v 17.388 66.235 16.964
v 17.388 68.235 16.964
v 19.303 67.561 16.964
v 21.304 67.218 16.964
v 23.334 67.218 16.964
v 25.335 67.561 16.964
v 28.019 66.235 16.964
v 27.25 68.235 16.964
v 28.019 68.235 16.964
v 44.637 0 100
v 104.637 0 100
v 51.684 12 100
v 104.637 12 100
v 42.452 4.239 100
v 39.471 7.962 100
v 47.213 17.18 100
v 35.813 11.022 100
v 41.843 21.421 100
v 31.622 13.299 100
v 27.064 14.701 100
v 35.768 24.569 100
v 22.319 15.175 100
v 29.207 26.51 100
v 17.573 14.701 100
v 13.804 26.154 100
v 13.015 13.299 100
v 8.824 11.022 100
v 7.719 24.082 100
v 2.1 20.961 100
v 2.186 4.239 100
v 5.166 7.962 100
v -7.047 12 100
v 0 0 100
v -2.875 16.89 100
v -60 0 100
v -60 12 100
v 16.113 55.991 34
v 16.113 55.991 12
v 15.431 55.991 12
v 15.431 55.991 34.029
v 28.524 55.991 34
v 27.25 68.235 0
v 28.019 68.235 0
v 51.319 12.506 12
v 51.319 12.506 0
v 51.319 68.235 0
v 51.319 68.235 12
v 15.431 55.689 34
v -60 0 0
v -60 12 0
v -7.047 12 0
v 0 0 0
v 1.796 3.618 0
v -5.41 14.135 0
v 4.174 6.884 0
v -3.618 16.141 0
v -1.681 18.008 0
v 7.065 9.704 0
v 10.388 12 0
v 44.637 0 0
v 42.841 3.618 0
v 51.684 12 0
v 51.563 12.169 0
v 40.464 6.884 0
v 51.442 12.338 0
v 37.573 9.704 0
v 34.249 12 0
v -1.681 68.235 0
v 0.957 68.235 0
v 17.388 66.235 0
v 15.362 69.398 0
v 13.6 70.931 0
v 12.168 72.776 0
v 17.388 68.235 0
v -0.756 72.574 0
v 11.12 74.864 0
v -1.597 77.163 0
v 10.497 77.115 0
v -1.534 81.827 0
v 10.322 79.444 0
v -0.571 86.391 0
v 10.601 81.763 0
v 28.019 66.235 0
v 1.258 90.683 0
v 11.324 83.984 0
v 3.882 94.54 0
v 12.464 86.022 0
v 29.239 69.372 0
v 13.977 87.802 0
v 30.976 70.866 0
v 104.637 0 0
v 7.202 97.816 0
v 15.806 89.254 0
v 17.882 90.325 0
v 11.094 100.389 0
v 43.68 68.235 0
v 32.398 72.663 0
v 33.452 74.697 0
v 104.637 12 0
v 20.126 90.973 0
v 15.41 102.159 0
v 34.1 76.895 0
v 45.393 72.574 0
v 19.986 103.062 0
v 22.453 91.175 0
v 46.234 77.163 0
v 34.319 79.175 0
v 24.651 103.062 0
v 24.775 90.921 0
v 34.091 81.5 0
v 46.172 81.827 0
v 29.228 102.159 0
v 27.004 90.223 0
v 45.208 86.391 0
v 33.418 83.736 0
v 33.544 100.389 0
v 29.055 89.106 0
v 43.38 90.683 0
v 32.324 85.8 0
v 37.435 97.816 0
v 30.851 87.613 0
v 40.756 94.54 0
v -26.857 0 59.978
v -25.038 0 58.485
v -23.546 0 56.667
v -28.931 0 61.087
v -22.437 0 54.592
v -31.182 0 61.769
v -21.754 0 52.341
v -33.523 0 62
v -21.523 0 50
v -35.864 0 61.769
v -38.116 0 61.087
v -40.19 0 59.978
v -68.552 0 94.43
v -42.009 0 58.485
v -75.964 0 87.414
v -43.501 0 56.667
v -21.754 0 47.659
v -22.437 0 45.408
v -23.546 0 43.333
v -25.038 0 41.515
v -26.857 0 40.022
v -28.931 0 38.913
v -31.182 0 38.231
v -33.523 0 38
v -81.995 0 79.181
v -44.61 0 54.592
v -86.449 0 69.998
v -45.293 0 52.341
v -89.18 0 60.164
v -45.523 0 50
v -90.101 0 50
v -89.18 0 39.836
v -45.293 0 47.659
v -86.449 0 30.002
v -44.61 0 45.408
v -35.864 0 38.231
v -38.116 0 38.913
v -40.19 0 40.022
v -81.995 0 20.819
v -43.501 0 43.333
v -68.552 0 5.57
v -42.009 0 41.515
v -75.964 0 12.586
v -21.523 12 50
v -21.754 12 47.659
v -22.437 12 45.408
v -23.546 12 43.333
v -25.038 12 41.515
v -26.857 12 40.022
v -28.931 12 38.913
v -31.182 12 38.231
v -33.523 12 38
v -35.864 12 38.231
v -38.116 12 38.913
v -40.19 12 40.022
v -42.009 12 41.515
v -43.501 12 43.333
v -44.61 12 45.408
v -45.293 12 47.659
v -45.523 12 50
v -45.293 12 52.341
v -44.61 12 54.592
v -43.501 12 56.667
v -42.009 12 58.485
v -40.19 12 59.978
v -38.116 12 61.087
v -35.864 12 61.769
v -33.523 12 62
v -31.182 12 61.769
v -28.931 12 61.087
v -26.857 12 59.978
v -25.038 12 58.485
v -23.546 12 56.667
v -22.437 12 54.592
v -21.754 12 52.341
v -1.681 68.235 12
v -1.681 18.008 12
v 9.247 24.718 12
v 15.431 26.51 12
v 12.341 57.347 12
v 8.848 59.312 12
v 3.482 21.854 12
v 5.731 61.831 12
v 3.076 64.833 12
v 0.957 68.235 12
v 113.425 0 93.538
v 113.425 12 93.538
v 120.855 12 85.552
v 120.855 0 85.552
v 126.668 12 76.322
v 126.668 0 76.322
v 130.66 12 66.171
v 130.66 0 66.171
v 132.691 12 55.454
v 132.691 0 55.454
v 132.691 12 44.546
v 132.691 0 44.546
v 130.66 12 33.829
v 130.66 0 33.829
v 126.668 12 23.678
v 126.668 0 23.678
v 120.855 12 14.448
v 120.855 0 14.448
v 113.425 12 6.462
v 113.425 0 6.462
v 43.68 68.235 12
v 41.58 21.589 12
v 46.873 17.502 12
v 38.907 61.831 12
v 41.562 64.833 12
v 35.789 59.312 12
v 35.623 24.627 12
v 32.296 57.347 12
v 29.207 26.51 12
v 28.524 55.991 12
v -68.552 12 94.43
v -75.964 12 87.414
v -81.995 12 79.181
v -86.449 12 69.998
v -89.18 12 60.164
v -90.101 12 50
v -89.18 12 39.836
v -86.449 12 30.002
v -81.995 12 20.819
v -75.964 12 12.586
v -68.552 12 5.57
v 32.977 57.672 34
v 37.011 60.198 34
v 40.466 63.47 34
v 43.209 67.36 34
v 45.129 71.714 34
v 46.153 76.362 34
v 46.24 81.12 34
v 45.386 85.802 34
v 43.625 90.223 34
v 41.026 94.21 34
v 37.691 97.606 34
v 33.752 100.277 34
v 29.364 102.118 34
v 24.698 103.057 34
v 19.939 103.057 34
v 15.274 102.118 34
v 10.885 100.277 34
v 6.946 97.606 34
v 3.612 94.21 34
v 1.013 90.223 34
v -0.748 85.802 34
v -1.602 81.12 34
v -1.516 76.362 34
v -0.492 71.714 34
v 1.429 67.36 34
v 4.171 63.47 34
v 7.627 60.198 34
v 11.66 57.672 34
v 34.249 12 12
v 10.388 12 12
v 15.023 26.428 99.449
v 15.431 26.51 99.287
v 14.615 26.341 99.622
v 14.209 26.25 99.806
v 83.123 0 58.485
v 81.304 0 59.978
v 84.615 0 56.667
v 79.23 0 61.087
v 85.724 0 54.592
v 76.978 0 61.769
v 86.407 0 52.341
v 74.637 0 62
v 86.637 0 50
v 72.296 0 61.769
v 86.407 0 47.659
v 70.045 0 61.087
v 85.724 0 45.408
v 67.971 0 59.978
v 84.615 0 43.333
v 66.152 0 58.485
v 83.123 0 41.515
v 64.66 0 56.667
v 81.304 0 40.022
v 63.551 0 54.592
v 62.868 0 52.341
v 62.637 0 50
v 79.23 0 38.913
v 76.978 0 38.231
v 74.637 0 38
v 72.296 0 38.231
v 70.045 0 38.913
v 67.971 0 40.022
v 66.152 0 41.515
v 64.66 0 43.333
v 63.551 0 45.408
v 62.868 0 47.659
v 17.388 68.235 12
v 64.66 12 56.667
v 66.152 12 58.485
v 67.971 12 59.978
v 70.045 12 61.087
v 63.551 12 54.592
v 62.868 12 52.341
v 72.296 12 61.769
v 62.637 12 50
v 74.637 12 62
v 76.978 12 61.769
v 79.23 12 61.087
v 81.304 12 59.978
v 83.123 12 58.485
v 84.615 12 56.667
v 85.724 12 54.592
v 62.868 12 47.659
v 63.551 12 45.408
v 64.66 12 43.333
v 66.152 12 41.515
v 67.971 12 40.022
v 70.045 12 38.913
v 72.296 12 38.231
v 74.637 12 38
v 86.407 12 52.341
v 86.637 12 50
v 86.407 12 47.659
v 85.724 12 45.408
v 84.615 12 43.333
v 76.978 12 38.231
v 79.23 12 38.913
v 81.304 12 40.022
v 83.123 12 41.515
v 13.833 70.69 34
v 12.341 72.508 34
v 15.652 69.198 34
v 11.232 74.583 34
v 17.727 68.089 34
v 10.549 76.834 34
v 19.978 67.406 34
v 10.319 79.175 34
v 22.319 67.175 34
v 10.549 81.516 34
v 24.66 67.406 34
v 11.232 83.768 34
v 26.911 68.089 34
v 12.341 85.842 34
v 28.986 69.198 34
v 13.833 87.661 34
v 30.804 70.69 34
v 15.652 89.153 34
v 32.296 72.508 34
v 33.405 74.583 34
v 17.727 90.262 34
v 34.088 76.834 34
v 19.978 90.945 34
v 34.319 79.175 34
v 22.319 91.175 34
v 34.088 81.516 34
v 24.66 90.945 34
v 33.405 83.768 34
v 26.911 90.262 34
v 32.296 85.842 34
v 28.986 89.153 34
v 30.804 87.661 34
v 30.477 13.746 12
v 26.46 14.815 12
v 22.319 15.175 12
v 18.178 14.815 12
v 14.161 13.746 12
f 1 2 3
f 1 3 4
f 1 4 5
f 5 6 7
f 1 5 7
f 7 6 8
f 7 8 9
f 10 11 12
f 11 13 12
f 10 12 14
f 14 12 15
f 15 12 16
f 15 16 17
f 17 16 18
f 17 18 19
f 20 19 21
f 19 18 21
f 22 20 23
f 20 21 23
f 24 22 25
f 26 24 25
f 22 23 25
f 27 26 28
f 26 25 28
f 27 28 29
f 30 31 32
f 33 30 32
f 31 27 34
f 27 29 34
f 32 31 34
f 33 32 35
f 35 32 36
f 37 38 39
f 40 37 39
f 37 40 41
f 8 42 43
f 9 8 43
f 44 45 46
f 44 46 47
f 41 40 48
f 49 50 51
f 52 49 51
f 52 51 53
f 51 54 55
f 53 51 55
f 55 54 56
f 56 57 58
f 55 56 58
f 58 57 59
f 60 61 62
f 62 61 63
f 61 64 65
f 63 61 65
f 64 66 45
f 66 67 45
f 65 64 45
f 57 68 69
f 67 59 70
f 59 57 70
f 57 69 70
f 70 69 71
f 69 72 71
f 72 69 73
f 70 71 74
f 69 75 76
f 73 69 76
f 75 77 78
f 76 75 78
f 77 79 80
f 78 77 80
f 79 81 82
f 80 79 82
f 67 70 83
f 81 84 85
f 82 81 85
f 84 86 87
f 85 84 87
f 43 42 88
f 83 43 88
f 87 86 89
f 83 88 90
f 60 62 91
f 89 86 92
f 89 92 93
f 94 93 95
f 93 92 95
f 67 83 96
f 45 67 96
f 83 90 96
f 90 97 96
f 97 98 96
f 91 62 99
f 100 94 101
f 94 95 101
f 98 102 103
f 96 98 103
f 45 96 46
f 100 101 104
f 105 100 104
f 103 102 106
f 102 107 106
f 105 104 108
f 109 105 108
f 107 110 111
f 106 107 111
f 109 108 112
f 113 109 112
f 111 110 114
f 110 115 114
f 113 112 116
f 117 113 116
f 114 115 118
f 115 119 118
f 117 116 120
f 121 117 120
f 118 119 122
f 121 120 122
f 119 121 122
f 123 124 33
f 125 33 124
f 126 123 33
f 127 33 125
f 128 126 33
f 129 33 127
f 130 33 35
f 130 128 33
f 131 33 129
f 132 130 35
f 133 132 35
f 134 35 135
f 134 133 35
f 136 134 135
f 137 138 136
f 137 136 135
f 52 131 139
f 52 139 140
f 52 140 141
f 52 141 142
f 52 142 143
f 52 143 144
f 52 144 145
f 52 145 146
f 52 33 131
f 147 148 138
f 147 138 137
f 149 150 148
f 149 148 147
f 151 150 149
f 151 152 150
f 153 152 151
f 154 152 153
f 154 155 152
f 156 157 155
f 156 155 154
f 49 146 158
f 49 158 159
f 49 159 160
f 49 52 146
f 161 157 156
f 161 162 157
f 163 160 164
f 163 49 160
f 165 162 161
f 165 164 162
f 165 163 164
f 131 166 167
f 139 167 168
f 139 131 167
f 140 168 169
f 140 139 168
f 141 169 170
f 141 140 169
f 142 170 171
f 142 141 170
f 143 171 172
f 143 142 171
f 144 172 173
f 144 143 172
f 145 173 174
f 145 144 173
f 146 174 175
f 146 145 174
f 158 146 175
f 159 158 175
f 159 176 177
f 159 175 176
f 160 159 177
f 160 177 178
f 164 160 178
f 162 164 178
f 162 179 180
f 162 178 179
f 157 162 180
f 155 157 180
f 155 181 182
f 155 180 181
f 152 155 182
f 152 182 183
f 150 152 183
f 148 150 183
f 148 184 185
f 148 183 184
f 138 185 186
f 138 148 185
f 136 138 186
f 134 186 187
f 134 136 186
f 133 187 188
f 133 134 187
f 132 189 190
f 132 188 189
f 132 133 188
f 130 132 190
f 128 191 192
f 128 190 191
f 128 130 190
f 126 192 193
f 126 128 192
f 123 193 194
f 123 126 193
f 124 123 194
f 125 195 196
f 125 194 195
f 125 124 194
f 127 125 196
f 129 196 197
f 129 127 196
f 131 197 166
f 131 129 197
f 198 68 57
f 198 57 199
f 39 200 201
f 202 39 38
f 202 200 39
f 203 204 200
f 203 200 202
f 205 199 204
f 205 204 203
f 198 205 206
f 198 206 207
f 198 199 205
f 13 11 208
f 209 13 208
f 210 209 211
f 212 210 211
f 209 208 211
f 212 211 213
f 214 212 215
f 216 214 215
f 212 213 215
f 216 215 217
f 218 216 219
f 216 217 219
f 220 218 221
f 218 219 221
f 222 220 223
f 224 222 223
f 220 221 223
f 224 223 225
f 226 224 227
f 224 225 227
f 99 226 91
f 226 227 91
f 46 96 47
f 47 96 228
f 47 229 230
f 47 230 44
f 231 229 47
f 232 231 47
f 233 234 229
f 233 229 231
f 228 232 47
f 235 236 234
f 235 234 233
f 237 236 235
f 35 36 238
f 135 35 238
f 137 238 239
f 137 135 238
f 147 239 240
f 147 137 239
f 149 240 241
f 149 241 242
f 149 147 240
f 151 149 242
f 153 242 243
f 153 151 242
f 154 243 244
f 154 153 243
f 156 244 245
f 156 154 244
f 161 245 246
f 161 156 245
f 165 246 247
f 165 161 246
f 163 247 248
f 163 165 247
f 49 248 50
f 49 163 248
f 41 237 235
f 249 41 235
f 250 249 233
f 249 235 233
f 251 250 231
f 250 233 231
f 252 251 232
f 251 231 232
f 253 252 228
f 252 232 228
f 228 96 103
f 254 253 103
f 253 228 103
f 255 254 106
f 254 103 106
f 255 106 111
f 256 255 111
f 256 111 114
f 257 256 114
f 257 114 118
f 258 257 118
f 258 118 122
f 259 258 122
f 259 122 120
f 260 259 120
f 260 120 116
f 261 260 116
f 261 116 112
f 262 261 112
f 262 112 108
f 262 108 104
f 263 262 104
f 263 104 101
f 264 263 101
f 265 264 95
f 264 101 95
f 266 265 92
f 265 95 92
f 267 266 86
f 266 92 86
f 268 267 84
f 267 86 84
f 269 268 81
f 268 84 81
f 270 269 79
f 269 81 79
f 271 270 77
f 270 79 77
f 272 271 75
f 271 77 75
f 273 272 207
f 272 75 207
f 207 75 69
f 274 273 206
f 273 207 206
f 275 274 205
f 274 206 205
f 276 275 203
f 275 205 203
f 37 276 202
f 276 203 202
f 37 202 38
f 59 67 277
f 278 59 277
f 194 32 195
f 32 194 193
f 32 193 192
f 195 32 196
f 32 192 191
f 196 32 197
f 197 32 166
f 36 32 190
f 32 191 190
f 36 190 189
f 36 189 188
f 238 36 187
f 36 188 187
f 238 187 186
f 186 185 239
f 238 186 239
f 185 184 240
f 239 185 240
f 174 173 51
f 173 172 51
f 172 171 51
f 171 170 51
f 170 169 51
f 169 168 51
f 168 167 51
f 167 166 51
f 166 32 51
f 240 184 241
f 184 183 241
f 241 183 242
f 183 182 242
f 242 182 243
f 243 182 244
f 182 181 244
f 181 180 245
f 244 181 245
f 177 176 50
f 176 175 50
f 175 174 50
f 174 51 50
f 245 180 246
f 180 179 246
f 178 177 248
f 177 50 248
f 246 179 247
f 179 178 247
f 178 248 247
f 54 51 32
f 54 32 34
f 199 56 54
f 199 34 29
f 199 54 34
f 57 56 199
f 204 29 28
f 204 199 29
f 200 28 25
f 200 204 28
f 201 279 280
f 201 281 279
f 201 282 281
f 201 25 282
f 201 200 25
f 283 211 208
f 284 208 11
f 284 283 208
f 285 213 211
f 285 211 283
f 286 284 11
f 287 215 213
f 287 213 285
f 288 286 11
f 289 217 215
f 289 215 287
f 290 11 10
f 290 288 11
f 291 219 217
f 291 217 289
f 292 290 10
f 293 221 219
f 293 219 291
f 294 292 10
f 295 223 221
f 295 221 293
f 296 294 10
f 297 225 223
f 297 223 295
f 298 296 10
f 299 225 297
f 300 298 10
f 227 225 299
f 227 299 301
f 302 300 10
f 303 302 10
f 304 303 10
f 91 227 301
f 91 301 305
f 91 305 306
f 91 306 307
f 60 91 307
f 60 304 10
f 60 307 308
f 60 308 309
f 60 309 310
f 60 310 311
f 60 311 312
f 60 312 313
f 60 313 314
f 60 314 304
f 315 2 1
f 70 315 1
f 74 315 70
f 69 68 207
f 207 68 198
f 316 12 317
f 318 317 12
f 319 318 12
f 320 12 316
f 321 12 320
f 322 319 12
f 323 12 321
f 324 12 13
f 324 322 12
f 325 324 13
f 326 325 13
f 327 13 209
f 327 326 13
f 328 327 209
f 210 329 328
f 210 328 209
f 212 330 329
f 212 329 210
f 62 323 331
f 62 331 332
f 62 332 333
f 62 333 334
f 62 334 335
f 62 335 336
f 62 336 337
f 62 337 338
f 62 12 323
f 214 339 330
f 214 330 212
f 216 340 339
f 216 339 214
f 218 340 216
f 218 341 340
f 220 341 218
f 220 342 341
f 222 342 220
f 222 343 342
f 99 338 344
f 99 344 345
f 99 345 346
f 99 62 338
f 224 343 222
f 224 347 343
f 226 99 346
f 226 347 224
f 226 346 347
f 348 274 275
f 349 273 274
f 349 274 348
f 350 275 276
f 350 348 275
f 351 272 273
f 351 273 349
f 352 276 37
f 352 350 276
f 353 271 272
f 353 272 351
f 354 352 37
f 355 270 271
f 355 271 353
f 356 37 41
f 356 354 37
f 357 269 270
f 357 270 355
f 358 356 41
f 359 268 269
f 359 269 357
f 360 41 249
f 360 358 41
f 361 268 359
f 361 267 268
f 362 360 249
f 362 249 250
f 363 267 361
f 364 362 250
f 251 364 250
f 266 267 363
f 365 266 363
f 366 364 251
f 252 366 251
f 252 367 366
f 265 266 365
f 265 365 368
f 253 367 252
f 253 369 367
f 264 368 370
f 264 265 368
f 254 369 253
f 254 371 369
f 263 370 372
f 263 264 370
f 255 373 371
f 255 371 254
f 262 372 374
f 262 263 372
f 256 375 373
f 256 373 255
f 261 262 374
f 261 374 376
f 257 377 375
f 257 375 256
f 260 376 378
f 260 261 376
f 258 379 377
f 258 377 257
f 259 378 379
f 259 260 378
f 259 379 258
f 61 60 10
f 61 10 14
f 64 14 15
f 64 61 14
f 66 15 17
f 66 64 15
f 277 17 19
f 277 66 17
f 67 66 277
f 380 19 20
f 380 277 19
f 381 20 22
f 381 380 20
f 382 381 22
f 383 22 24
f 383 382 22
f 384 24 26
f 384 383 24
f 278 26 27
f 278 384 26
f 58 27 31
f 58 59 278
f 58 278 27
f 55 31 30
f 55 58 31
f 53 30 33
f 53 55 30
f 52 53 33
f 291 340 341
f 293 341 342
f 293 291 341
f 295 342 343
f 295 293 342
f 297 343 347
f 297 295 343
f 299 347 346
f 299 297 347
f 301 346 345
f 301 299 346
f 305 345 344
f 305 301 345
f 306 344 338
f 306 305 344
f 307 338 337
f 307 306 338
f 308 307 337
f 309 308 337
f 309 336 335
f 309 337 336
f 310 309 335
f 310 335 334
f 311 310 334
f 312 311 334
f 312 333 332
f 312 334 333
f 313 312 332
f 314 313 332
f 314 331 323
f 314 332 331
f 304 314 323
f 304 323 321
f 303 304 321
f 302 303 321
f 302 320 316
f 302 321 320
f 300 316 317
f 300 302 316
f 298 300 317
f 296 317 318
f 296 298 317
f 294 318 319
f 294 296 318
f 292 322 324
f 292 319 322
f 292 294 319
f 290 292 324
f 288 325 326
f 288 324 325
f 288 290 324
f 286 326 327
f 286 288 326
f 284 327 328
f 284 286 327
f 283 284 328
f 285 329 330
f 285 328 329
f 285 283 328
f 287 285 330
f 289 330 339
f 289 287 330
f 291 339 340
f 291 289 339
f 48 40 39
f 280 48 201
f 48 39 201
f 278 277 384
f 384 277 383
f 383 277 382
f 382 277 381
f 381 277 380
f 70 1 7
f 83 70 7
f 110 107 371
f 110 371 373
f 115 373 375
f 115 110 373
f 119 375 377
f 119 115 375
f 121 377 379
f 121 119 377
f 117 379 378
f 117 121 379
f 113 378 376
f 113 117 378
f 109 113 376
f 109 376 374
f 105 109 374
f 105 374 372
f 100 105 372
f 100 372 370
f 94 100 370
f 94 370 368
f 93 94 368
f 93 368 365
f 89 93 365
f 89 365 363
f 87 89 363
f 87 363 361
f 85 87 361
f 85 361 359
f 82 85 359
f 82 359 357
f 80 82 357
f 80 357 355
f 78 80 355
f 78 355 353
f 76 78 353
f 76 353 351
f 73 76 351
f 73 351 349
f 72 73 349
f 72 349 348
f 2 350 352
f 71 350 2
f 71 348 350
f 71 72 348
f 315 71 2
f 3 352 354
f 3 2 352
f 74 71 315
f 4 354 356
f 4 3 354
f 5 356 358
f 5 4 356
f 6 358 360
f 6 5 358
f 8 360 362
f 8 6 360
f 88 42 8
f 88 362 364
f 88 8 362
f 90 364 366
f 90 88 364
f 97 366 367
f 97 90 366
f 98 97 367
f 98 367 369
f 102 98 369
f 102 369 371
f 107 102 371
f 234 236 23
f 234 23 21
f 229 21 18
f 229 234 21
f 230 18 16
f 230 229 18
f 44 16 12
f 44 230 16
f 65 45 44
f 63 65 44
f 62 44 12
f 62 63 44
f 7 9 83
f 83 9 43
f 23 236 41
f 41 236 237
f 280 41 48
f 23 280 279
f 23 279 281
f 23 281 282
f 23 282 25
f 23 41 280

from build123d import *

# Parameters (mm, degrees)
BOSS_EXTRUDE2_DEPTH  = 100
SKETCH2_R            = 12
CUT_EXTRUDE2_DEPTH   = 100
BOSS_EXTRUDE3_DEPTH  = 12
SKETCH4_R            = 24
SKETCH4_R_2          = 12
BOSS_EXTRUDE4_DEPTH  = 34
SKETCH9_W            = 12
SKETCH9_H            = 56.23521347
BOSS_EXTRUDE14_DEPTH = 53
BOSS_EXTRUDE15_DEPTH = 100
CUT_EXTRUDE5_DEPTH   = 100
SKETCH18_W           = 10.631018499
SKETCH18_H           = 16.963963476
CUT_EXTRUDE6_DEPTH   = 2


with BuildPart() as part:
    # Sketch1 → Boss-Extrude2 (new body)
    with BuildSketch(Plane.XY):
        with BuildLine():
            Line((0, 0), (-60, 0))
            Line((-60, 0), (-60, 12))
            Line((-60, 12), (-7.046781234, 12))
            ThreePointArc((-7.046781234, 12), (22.318707009, 27.175300716), (51.684195251, 12))
            Line((51.684195251, 12), (104.637414017, 12))
            Line((104.637414017, 12), (104.637414017, 0))
            Line((104.637414017, 0), (44.637414017, 0))
            ThreePointArc((44.637414017, 0), (22.318707009, 15.175300716), (0, 0))
        make_face()
    extrude(amount=BOSS_EXTRUDE2_DEPTH)

    # Sketch2 → Cut-Extrude2 (cut)
    with BuildSketch(Plane(origin=(0, 0, 0), x_dir=(1, 0, 0), z_dir=(0, 1, 0))):
        with Locations((-33.523390617, -50)):
            Circle(SKETCH2_R)
        with Locations((74.637414017, -50)):
            Circle(SKETCH2_R)
    extrude(amount=CUT_EXTRUDE2_DEPTH, mode=Mode.SUBTRACT)

    # Sketch3 → Boss-Extrude3 (add)
    with BuildSketch(Plane(origin=(0, 0, 0), x_dir=(1, 0, 0), z_dir=(0, 1, 0))):
        with BuildLine():
            Line((-60, 0), (-60, -100))
            ThreePointArc((-60, -100), (-90.100867093, -50), (-60, 0))
        make_face()
        with BuildLine():
            Line((104.637414017, 0), (104.637414017, -100))
            ThreePointArc((104.637414017, -100), (132.946932966, -50), (104.637414017, 0))
        make_face()
    extrude(amount=BOSS_EXTRUDE3_DEPTH)



with BuildPart() as body_2:
    # Sketch4 → Boss-Extrude4 (new body)
    with BuildSketch(Plane.XY):
        with Locations((22.318707009, 79.175300716)):
            Circle(SKETCH4_R)
        with Locations((22.318707009, 79.175300716)):
            Circle(SKETCH4_R_2, mode=Mode.SUBTRACT)
    extrude(amount=BOSS_EXTRUDE4_DEPTH)


with BuildPart() as part_1:
    add(part.part)

    add(body_2.part)  # Boss-Extrude14 merges body 2
    # Sketch9 → Boss-Extrude14 (add)
    with BuildSketch(Plane.ZY.offset(1.681292991)):
        with Locations((6, 40.117606735)):
            Rectangle(SKETCH9_W, SKETCH9_H)
    extrude(amount=-BOSS_EXTRUDE14_DEPTH)

    # Sketch15 → Boss-Extrude15 (add)
    with BuildSketch(Plane.XY):
        Polygon((15.430799057, 55.991491628), (15.430799057, 26.510222876), (29.20661496, 26.510222876), (28.524429867, 55.991491628), align=None)
    extrude(amount=BOSS_EXTRUDE15_DEPTH)

    # Sketch16 → Cut-Extrude5 (cut)
    with BuildSketch(Plane(origin=(29.804092856, 0.689655118, 0), x_dir=(0, 0, -1), z_dir=(0.999732387, 0.023133419, 0))):
        Polygon((-34, 55.316639981), (-100, 25.827479536), (-100, 55.316639981), (-101.715628872, 69.701769469), (-35.158701994, 67.524066269), align=None)
    extrude(amount=-CUT_EXTRUDE5_DEPTH, mode=Mode.SUBTRACT)

    # Sketch18 → Cut-Extrude6 (cut)
    with BuildSketch(Plane(origin=(0, 68.23521347, 0), x_dir=(1, 0, 0), z_dir=(0, 1, 0))):
        with Locations((22.703243631, -8.481981738)):
            Rectangle(SKETCH18_W, SKETCH18_H)
    extrude(amount=-CUT_EXTRUDE6_DEPTH, mode=Mode.SUBTRACT)


solid = part_1.part
